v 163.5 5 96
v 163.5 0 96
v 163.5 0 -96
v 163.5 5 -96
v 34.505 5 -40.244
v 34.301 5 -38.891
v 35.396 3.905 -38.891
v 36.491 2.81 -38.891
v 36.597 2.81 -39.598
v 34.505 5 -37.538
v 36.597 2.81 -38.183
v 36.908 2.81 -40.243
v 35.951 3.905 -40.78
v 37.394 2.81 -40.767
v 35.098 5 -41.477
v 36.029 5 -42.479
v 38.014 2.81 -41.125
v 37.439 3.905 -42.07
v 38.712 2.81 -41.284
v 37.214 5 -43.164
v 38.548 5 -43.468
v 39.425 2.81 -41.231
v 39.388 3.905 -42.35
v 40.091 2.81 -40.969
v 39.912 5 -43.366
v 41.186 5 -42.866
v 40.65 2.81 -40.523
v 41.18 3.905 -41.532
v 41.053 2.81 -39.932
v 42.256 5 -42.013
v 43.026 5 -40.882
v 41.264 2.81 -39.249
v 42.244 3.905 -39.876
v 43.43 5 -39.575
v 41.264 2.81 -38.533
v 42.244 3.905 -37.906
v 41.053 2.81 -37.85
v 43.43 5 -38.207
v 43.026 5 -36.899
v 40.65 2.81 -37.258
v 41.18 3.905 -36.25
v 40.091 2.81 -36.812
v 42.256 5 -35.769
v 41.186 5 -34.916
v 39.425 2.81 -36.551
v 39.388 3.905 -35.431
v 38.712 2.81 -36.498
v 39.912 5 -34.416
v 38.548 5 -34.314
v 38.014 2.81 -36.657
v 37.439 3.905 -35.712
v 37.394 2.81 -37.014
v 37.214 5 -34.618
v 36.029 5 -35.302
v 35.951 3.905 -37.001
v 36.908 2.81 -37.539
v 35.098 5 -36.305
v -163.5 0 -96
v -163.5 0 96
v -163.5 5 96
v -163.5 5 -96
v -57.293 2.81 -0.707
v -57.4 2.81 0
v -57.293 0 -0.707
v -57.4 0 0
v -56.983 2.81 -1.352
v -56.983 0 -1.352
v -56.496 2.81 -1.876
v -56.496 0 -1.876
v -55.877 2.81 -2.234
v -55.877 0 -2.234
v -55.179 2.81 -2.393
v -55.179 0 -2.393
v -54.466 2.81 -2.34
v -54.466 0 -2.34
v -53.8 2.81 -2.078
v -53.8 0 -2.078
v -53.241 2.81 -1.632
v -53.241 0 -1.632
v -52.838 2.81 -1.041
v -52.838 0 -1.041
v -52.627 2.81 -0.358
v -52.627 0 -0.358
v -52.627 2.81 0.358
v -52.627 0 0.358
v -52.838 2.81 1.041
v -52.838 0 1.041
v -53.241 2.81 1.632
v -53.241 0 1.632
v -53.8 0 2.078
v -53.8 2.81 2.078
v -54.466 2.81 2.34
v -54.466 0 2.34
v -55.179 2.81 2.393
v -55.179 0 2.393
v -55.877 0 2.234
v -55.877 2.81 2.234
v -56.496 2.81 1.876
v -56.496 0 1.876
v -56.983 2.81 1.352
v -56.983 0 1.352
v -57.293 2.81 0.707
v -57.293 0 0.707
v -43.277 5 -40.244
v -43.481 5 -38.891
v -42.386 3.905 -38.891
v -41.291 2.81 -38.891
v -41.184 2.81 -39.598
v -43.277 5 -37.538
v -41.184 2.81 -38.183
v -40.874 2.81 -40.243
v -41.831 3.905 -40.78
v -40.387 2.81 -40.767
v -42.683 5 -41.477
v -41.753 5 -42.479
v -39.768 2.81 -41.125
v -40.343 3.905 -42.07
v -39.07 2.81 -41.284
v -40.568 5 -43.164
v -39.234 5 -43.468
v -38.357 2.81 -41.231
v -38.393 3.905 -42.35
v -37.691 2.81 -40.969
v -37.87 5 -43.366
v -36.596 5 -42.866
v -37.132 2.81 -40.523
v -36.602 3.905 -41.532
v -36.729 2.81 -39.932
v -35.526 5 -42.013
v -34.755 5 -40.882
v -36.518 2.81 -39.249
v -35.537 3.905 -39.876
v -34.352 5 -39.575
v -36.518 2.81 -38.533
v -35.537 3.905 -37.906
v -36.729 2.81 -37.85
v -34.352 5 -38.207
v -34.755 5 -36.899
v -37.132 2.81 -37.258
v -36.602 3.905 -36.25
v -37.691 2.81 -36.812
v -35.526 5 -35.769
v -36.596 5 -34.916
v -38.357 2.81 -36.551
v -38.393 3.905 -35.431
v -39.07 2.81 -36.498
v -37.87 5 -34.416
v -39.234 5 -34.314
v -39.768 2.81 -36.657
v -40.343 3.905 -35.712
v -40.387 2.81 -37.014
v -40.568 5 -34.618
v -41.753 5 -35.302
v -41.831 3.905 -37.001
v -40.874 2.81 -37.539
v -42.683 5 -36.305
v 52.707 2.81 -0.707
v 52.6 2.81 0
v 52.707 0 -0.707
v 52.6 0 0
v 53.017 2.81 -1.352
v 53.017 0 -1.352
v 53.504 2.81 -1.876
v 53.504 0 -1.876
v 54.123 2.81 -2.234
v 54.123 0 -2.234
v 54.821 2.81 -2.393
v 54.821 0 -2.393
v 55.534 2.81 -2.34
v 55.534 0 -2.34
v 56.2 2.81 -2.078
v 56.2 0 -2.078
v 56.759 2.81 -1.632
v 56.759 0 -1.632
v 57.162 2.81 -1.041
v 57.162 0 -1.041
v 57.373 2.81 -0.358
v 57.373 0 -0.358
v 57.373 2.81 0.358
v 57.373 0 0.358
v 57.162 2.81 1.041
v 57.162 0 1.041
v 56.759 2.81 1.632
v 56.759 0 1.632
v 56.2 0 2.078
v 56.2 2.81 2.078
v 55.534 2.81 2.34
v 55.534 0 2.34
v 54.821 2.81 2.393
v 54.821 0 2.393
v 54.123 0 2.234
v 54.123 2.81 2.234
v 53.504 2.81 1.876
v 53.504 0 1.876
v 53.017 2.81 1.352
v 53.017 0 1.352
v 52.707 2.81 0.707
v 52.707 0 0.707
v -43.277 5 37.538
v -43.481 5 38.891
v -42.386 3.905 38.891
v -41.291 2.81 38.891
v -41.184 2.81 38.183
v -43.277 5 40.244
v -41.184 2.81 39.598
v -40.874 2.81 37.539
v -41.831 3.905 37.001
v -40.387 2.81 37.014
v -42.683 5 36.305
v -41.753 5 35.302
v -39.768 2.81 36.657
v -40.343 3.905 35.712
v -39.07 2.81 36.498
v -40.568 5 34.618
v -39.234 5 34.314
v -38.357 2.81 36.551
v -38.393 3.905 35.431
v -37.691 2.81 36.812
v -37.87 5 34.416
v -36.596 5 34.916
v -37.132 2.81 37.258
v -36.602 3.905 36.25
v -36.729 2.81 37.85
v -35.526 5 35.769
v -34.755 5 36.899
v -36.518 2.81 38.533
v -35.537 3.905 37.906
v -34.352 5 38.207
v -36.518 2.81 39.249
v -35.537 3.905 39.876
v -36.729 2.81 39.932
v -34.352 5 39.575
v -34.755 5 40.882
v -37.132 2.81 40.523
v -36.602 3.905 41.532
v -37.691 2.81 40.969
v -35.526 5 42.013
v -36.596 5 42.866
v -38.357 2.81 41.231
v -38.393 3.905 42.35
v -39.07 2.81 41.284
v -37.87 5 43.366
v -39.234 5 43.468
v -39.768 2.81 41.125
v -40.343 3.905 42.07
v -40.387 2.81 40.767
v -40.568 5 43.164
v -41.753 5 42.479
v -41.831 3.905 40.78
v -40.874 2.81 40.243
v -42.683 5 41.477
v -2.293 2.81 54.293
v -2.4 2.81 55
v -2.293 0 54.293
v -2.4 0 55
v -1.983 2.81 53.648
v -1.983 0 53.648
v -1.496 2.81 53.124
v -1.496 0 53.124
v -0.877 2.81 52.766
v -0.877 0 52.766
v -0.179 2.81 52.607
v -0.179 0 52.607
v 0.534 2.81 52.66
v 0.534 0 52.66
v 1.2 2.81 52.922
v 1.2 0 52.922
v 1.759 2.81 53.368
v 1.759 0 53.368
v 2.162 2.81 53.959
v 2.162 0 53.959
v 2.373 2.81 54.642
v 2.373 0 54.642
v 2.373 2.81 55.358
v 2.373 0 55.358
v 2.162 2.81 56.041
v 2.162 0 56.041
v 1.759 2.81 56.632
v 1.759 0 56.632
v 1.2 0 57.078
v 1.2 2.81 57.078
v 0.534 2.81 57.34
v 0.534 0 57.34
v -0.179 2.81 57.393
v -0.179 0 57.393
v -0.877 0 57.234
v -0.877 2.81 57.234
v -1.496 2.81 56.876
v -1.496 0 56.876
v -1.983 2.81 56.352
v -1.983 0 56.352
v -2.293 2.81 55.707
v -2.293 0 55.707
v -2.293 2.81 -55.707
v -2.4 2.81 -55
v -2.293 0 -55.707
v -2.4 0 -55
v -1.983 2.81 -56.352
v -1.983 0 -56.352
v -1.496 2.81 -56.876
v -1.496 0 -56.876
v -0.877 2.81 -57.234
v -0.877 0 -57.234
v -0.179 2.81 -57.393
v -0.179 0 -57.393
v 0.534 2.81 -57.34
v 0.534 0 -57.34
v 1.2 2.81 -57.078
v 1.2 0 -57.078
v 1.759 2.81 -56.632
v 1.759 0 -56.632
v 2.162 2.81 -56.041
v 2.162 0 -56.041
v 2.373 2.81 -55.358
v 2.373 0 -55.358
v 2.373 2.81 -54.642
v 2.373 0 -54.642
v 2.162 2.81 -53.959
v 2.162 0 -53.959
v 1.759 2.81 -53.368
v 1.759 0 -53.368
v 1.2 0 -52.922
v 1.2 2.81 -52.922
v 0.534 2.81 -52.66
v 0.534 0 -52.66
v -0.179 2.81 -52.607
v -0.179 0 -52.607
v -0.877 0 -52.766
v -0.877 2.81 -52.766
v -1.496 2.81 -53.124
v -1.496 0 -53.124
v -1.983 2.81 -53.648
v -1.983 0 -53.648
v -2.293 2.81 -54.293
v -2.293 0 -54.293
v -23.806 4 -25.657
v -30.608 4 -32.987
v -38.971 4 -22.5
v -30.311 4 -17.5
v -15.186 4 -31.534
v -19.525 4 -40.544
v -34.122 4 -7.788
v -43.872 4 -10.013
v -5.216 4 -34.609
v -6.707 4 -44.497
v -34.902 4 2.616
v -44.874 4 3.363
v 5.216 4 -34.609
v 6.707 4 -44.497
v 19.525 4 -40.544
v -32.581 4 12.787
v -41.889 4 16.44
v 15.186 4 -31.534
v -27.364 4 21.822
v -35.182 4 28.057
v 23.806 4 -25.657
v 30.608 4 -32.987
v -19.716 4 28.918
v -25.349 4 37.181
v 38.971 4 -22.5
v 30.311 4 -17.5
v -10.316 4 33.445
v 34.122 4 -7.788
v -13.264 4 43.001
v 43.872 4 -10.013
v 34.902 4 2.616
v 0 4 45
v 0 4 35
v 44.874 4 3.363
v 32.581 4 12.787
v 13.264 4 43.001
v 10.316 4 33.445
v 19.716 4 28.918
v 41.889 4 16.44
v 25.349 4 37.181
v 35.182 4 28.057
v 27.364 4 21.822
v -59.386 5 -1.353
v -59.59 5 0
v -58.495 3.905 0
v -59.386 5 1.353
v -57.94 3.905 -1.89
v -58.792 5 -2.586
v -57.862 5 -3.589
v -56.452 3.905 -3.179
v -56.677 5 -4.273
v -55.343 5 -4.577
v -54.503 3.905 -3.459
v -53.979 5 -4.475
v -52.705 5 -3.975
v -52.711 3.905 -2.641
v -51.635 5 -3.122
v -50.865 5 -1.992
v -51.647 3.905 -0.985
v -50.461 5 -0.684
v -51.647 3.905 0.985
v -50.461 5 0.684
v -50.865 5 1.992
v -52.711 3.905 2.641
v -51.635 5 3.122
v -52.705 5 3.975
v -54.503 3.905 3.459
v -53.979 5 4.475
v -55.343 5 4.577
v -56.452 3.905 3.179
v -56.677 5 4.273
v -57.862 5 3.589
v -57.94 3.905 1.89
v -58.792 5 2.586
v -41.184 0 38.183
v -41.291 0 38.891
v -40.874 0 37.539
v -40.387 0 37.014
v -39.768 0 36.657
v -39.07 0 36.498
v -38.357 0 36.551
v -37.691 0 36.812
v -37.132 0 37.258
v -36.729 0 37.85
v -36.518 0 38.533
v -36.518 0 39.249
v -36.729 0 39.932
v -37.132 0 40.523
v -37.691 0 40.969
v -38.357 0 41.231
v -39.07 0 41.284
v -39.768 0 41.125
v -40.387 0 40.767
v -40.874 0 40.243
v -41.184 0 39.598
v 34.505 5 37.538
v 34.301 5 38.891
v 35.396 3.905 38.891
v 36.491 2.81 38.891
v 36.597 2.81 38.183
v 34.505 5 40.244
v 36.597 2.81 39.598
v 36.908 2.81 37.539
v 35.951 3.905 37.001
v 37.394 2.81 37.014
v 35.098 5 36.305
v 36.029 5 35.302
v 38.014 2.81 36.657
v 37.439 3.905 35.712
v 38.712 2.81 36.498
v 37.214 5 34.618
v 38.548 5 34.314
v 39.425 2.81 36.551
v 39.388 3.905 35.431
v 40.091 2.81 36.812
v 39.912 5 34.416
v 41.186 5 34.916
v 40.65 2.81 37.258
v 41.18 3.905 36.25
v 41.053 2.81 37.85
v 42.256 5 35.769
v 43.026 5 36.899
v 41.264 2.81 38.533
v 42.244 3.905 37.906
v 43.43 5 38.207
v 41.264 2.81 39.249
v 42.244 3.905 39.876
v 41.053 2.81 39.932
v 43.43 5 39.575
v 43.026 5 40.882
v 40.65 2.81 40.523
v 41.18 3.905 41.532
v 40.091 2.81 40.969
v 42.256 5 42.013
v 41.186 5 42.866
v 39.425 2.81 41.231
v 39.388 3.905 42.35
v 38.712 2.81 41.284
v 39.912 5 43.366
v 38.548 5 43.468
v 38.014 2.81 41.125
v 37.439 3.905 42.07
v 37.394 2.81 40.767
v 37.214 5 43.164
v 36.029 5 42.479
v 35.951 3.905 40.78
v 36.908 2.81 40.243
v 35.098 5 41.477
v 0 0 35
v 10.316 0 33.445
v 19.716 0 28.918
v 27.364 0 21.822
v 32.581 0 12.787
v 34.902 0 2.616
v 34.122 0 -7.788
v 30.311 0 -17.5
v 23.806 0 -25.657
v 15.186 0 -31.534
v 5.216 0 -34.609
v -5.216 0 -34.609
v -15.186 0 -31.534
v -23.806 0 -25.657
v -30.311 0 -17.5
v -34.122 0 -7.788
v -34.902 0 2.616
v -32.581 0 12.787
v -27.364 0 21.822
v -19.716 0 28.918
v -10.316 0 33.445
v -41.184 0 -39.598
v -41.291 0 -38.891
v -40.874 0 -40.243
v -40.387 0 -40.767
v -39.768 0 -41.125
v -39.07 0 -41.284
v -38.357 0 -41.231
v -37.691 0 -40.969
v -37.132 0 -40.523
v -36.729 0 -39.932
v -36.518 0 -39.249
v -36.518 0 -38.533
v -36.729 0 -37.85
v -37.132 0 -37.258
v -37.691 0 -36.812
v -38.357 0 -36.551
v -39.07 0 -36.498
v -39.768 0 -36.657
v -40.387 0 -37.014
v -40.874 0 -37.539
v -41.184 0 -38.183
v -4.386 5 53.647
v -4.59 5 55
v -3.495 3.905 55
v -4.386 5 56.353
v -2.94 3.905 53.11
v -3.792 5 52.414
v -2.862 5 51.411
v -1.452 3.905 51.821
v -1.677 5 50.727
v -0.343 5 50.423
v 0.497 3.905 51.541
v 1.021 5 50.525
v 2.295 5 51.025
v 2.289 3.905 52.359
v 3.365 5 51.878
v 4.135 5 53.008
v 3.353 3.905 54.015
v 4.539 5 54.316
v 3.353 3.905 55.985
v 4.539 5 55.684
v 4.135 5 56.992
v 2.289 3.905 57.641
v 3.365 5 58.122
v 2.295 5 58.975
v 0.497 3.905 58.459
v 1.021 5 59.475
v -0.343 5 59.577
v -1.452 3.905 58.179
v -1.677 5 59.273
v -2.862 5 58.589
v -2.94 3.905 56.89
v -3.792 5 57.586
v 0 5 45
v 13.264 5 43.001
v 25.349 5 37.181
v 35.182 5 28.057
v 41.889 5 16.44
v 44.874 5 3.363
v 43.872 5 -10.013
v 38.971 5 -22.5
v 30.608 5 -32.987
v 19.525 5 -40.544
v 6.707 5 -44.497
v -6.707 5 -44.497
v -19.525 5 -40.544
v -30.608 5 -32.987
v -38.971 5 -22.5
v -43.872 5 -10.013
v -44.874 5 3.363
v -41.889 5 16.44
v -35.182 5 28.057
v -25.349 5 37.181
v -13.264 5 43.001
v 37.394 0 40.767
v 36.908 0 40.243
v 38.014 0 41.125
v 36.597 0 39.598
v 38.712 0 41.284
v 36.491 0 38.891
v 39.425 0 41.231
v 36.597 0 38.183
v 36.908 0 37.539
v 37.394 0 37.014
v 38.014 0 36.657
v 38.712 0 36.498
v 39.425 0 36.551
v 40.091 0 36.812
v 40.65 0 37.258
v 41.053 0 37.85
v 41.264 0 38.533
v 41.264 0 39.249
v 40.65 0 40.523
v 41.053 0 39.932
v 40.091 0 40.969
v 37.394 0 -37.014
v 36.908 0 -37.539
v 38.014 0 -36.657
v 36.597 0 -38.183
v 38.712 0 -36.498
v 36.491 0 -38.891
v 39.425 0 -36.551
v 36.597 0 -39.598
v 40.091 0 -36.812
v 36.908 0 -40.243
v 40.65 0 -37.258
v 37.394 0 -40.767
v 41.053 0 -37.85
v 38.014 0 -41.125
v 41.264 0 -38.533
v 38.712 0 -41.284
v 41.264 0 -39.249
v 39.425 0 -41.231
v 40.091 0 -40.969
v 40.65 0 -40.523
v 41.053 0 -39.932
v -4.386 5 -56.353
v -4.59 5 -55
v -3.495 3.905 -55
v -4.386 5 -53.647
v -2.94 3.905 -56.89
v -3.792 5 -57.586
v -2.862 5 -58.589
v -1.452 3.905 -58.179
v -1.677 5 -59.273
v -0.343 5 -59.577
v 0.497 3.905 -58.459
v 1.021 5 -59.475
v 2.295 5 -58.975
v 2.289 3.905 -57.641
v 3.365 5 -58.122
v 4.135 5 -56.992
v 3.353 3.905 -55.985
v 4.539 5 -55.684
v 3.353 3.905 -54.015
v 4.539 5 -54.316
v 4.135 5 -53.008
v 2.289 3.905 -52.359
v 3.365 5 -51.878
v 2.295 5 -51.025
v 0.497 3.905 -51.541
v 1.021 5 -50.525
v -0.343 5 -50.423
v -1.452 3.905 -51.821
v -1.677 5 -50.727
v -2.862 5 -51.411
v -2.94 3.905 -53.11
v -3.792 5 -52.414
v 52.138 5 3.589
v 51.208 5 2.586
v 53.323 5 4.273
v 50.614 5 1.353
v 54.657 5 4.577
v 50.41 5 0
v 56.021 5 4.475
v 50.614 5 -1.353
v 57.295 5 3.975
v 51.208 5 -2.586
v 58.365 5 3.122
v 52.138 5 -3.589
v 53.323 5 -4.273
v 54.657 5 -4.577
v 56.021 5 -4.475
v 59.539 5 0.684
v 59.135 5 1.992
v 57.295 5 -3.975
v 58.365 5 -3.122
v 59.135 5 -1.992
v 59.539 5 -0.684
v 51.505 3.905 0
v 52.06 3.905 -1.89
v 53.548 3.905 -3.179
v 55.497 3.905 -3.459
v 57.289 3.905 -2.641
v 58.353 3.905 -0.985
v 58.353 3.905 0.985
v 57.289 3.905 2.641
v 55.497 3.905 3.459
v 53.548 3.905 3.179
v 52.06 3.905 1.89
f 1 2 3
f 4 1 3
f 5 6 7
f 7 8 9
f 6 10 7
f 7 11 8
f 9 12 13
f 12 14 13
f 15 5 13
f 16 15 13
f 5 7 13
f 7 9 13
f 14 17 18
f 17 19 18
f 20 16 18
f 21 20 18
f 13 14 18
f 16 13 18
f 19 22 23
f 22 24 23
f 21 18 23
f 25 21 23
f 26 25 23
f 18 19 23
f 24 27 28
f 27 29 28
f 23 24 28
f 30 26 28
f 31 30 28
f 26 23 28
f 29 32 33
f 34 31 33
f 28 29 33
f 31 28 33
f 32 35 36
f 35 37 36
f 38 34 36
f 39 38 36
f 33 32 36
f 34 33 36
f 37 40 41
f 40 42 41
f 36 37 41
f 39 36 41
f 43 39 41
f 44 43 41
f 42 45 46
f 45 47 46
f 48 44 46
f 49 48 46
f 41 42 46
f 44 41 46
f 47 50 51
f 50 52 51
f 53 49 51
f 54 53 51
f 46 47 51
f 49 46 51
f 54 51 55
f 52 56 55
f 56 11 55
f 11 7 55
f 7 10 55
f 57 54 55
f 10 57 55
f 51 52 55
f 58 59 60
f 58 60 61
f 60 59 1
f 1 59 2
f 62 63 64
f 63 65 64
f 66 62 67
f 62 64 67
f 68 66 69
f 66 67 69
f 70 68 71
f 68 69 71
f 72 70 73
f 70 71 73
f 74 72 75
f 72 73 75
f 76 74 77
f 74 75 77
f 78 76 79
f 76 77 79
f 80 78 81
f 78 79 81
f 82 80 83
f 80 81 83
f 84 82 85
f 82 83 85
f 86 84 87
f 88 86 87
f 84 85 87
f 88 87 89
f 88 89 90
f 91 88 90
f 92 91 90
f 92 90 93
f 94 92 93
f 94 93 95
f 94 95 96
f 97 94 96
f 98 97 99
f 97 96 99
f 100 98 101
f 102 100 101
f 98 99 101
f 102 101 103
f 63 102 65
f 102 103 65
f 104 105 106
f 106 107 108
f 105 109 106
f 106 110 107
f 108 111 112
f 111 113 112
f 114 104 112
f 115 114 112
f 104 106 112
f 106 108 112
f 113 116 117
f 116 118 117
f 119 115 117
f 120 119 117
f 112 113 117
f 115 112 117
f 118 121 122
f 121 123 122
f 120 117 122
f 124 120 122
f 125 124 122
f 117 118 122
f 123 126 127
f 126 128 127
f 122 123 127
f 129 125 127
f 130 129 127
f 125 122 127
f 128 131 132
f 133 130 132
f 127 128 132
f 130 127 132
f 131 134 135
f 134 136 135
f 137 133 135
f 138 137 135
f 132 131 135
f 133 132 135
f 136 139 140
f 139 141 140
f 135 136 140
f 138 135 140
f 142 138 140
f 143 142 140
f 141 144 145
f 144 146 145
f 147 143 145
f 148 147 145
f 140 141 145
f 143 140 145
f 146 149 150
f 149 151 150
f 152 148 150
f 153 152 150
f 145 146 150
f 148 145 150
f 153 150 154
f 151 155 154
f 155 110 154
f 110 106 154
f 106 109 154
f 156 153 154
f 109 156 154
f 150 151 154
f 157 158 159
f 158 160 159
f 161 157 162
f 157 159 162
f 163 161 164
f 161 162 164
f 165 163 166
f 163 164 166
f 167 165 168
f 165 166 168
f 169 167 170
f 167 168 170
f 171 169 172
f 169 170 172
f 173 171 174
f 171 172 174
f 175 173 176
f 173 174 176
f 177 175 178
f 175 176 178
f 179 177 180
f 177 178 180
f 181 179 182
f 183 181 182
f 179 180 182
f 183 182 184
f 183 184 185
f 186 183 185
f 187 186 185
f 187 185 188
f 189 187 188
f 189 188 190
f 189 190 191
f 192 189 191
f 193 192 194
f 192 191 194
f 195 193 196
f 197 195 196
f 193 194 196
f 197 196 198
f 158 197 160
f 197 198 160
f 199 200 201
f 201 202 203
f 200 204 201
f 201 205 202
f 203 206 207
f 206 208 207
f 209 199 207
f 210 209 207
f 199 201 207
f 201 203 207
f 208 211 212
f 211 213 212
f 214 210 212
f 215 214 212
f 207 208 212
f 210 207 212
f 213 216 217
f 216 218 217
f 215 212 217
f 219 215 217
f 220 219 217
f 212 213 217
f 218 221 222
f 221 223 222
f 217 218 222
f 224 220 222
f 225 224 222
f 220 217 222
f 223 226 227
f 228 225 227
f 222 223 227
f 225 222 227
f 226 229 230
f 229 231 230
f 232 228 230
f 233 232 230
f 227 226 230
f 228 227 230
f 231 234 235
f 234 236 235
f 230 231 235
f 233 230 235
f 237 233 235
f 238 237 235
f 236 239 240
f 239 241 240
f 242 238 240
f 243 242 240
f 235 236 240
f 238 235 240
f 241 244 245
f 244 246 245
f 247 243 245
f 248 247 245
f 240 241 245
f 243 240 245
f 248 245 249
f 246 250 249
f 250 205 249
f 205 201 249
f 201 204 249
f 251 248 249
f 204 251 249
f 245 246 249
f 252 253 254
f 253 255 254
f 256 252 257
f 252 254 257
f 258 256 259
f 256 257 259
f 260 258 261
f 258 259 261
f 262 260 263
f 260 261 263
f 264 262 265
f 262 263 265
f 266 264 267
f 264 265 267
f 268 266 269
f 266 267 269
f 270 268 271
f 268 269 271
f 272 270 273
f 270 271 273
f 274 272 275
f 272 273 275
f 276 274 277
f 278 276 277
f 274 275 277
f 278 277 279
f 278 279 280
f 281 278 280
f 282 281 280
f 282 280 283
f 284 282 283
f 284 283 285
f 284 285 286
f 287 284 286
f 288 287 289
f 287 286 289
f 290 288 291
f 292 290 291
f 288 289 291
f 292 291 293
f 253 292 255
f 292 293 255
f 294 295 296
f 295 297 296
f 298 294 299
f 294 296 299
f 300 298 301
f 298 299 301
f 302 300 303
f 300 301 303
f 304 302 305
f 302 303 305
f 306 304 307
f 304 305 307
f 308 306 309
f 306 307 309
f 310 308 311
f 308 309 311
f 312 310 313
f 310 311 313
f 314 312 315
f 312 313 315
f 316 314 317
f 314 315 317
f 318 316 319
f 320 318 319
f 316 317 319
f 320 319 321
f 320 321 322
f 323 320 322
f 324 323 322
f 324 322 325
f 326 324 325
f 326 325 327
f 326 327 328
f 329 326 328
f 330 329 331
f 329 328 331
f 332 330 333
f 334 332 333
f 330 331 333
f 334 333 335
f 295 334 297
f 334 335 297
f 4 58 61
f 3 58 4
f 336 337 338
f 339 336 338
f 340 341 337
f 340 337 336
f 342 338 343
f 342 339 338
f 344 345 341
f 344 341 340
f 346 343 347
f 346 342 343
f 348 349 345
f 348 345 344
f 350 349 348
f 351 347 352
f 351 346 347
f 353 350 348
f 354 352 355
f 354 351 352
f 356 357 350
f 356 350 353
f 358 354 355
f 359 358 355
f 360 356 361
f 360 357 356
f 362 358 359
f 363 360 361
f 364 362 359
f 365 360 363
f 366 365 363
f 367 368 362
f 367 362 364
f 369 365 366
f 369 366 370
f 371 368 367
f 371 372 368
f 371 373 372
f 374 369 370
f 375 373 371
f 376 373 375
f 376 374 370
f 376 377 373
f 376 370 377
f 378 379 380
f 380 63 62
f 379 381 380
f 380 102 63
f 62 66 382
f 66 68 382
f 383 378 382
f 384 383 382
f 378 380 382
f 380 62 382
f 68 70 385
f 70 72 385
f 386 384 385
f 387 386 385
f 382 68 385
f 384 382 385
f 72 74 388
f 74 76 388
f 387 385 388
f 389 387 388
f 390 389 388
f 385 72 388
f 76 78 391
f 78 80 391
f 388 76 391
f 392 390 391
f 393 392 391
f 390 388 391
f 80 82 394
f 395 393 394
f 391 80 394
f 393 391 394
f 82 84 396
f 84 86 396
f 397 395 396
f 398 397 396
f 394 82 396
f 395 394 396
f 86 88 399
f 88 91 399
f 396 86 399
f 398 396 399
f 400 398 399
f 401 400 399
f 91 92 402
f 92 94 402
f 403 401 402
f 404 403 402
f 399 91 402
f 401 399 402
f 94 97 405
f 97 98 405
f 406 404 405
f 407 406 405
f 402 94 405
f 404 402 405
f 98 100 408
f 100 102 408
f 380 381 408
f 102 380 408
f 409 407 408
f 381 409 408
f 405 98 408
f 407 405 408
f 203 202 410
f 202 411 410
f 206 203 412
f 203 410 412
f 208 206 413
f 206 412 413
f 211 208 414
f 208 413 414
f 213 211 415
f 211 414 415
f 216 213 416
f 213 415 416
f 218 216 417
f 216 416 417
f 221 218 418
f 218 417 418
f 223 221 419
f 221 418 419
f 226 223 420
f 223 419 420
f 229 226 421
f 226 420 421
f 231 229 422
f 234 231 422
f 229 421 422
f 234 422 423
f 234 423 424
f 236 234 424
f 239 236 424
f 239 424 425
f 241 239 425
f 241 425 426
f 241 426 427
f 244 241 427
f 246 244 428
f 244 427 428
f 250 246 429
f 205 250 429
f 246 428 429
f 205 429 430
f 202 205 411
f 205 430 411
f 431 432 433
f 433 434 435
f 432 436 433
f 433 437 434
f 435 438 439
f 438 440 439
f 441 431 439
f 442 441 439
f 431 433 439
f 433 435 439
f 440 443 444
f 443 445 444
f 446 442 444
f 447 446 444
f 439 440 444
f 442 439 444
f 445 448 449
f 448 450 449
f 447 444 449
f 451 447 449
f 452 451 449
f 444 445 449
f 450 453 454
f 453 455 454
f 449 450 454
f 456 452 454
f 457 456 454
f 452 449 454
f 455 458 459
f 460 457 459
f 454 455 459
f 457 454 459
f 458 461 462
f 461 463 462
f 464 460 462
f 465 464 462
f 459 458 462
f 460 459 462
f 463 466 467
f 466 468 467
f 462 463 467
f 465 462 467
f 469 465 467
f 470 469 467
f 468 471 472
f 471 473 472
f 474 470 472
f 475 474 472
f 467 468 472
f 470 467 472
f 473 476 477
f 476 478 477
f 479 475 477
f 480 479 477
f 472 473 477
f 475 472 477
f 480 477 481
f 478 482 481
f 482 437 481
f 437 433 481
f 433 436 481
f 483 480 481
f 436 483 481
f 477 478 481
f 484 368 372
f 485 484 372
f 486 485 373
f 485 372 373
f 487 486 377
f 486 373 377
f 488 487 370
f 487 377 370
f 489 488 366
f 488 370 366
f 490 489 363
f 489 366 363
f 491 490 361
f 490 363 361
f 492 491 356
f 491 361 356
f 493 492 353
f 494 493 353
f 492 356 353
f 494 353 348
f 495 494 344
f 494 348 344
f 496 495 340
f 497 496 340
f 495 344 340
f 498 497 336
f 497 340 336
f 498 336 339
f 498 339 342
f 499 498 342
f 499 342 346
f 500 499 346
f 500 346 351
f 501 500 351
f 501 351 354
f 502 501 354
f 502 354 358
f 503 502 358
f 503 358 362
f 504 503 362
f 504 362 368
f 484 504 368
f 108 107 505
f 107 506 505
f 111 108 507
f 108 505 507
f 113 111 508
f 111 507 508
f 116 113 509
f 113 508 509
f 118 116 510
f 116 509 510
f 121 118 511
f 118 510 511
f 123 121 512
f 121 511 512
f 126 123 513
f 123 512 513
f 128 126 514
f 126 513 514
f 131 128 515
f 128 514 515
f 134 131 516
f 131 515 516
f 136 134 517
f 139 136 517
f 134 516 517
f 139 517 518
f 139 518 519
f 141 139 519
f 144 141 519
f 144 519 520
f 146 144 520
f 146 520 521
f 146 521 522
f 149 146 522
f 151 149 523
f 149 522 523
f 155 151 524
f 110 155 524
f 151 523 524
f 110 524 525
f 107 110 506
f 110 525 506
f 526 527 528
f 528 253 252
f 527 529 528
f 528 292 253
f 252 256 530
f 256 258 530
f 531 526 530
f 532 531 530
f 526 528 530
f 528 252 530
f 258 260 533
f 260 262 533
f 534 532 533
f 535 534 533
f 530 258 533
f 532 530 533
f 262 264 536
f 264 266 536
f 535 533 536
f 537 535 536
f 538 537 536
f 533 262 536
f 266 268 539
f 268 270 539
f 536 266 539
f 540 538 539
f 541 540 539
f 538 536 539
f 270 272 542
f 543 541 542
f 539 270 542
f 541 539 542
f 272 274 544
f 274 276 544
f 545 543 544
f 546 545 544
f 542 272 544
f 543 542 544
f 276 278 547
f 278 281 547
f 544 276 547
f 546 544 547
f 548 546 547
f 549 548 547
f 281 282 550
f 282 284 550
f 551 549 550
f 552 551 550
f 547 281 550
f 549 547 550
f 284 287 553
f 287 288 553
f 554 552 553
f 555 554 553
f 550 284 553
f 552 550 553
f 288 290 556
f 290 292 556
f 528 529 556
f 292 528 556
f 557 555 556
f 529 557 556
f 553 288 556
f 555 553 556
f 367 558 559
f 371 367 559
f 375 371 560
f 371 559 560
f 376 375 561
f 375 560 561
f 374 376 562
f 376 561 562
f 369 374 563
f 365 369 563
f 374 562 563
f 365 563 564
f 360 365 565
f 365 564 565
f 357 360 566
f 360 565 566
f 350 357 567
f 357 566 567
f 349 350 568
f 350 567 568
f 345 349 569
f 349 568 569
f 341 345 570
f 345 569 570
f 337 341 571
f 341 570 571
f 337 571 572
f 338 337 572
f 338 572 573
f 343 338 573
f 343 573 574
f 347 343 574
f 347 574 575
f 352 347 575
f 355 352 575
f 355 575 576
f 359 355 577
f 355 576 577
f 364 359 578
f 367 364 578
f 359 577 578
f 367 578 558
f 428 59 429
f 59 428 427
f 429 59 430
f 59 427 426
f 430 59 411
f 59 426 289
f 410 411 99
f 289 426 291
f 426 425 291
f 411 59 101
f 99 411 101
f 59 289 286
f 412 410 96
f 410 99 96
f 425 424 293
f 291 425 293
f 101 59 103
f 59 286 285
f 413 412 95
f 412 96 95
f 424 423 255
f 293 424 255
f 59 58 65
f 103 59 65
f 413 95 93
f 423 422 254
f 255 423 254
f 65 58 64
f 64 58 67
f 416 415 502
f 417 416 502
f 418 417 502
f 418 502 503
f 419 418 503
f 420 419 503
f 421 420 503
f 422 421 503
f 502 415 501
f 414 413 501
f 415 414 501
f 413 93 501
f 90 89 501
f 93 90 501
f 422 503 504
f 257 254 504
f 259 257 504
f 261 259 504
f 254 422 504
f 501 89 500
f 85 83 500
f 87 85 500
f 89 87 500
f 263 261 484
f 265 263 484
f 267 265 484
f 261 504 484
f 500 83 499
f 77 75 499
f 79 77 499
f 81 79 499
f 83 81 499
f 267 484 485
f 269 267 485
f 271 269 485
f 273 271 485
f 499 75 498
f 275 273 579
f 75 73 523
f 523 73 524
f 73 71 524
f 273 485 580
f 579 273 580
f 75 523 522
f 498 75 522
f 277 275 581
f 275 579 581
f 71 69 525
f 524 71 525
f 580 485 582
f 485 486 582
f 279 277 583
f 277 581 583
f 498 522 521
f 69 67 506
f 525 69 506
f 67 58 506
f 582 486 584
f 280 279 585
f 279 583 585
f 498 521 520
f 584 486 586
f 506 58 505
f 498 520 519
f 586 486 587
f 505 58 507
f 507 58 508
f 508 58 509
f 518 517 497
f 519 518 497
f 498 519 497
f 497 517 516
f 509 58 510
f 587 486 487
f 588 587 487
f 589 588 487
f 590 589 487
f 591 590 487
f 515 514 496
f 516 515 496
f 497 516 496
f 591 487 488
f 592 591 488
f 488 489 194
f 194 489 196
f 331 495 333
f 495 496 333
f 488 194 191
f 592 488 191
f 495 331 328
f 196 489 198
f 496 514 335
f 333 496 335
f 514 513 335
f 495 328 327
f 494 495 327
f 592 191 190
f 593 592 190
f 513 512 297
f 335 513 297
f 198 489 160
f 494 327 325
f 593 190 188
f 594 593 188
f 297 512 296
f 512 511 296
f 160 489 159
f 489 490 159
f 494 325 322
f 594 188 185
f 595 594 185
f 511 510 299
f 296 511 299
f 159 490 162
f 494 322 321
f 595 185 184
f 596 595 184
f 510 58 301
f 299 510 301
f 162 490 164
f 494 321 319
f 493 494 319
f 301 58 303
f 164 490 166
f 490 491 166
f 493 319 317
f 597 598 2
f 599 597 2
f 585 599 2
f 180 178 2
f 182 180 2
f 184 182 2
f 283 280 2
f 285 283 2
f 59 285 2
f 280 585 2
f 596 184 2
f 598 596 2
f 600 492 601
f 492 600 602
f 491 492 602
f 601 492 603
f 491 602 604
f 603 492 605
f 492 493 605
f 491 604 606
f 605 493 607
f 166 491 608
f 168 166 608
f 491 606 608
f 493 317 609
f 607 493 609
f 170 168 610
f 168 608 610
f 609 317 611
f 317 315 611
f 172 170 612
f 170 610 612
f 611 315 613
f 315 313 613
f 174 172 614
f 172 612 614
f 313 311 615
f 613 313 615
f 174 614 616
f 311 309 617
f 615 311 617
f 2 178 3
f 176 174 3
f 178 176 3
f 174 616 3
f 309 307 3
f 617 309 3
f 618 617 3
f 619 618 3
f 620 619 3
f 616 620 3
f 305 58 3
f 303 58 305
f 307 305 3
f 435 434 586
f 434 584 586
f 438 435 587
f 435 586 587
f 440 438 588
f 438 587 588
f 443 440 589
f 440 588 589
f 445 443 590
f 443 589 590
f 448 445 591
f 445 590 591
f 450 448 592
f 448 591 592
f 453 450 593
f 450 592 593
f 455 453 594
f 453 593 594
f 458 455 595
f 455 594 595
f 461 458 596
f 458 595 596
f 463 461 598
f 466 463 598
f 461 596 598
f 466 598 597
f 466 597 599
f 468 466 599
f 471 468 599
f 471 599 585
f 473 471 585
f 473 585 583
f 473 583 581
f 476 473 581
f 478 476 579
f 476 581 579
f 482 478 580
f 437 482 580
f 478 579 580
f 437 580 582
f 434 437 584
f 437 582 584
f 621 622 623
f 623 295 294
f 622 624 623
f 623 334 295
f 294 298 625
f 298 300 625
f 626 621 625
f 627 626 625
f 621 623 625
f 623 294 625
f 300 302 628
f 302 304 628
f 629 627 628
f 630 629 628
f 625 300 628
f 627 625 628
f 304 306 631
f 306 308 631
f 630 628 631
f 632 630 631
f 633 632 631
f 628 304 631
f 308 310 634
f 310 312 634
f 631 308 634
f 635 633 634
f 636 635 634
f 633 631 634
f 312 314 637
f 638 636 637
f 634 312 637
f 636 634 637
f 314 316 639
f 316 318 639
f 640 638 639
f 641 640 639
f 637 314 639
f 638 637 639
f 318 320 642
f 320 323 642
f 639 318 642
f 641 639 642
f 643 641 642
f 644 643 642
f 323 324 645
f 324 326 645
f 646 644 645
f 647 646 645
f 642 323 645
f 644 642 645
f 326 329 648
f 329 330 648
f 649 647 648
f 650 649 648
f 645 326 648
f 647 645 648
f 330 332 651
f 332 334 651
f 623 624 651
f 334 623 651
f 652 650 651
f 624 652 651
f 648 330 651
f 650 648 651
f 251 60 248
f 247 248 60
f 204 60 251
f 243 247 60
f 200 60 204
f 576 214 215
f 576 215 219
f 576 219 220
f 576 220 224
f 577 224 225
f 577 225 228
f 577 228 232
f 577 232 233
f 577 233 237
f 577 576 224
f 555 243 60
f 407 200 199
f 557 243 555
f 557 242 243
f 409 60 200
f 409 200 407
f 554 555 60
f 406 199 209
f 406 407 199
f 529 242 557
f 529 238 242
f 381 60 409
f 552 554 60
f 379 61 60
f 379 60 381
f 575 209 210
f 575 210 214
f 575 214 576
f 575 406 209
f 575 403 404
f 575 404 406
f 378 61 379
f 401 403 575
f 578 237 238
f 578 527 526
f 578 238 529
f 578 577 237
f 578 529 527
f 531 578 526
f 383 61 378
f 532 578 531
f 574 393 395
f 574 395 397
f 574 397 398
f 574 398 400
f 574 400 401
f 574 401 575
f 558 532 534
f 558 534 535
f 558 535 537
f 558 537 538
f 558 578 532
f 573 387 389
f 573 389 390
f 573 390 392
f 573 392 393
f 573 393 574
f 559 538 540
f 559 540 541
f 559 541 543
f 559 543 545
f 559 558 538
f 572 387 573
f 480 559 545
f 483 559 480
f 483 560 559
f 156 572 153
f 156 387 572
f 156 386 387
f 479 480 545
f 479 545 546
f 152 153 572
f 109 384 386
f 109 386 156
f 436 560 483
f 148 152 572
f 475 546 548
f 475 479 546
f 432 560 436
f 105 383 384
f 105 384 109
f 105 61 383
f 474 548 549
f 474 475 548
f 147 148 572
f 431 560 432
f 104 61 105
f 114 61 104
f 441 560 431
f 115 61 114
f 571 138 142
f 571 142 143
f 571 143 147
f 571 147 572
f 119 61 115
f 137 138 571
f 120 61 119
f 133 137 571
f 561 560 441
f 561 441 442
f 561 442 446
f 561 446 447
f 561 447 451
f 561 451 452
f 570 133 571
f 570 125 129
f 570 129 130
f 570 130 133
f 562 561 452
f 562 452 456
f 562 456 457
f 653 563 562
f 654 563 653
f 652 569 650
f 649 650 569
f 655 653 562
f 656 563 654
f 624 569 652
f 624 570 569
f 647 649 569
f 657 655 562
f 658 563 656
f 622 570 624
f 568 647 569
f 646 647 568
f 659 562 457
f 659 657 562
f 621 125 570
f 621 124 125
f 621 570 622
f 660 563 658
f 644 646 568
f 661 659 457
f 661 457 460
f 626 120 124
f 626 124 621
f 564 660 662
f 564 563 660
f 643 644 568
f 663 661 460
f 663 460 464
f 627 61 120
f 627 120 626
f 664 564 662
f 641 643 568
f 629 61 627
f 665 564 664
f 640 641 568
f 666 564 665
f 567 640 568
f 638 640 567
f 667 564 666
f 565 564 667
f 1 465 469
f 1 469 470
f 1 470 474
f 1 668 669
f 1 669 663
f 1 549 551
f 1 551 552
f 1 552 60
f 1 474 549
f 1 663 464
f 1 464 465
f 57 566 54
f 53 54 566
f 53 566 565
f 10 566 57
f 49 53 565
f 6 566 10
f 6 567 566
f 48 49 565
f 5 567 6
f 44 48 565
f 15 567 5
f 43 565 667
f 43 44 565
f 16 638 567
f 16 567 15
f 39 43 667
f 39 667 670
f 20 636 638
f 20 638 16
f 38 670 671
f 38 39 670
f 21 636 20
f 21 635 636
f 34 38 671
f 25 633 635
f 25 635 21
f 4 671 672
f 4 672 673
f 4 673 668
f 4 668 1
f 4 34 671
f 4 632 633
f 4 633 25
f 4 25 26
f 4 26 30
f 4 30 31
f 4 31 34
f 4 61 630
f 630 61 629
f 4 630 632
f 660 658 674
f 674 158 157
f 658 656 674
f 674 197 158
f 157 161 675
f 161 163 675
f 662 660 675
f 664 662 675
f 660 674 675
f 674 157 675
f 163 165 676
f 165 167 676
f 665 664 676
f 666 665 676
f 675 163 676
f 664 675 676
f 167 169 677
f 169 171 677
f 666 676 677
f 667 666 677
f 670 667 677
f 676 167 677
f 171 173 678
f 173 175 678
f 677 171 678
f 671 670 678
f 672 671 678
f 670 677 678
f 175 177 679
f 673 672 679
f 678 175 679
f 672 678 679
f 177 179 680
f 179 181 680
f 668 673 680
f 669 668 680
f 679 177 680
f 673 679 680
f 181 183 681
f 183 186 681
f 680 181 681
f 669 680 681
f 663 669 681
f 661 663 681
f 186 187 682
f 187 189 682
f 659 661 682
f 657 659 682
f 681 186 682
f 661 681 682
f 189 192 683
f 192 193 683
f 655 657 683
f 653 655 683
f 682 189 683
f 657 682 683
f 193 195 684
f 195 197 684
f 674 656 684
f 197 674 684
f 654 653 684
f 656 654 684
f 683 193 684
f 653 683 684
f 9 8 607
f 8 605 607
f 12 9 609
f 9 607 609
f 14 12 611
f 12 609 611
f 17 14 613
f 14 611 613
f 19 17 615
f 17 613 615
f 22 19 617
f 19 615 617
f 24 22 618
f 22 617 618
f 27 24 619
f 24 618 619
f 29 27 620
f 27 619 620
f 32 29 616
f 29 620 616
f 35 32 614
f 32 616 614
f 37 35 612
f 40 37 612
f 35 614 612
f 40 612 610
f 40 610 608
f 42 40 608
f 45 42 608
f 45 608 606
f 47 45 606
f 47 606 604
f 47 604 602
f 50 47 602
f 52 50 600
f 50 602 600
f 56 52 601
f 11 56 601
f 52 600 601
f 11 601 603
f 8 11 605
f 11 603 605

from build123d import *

# Parameters (mm, degrees)
SKETCH1_W                                            = 327
SKETCH1_H                                            = 192
BOSS_EXTRUDE1_DEPTH                                  = 5
SKETCH2_R                                            = 35
CUT_EXTRUDE1_DEPTH                                   = 190.666154071
SKETCH3_R                                            = 45
CUT_EXTRUDE2_DEPTH                                   = 1
CSK_FOR_M4_HEX_SOCKET_COUNTERSUNK_HEAD_S_D           = 4.8
CSK_FOR_M4_HEX_SOCKET_COUNTERSUNK_HEAD_S_CSINK_D     = 9.18
CSK_FOR_M4_HEX_SOCKET_COUNTERSUNK_HEAD_S_CSINK_ANGLE = 90


with BuildPart() as part:
    # Sketch1 → Boss-Extrude1 (new body)
    with BuildSketch(Plane(origin=(0, 0, 0), x_dir=(1, 0, 0), z_dir=(0, 1, 0))):
        Rectangle(SKETCH1_W, SKETCH1_H)
    extrude(amount=BOSS_EXTRUDE1_DEPTH)

    # Sketch2 → Cut-Extrude1 (cut, through all)
    with BuildSketch(Plane(origin=(0, 5, 0), x_dir=(1, 0, 0), z_dir=(0, 1, 0))):
        with Locations(Location((0, 0, 0), (0, 0, 270))):
            Circle(SKETCH2_R)
    extrude(amount=-CUT_EXTRUDE1_DEPTH, mode=Mode.SUBTRACT)

    # Sketch3 → Cut-Extrude2 (cut)
    with BuildSketch(Plane(origin=(0, 5, 0), x_dir=(1, 0, 0), z_dir=(0, 1, 0))):
        with Locations(Location((0, 0, 0), (0, 0, 270))):
            Circle(SKETCH3_R)
    extrude(amount=-CUT_EXTRUDE2_DEPTH, mode=Mode.SUBTRACT)

    # CSK for M4 Hex Socket Countersunk Head Screw1 (through all)
    with Locations(Plane(origin=(0, 5, 0), x_dir=(1, 0, 0), z_dir=(0, 1, 0))):
        with Locations((-38.890872965, -38.890872965), (-55, 0), (-38.890872965, 38.890872965), (0, 55), (38.890872965, 38.890872965), (55, 0), (38.890872965, -38.890872965), (0, -55)):
            CounterSinkHole(CSK_FOR_M4_HEX_SOCKET_COUNTERSUNK_HEAD_S_D / 2, CSK_FOR_M4_HEX_SOCKET_COUNTERSUNK_HEAD_S_CSINK_D / 2, counter_sink_angle=CSK_FOR_M4_HEX_SOCKET_COUNTERSUNK_HEAD_S_CSINK_ANGLE)


solid = part.part
